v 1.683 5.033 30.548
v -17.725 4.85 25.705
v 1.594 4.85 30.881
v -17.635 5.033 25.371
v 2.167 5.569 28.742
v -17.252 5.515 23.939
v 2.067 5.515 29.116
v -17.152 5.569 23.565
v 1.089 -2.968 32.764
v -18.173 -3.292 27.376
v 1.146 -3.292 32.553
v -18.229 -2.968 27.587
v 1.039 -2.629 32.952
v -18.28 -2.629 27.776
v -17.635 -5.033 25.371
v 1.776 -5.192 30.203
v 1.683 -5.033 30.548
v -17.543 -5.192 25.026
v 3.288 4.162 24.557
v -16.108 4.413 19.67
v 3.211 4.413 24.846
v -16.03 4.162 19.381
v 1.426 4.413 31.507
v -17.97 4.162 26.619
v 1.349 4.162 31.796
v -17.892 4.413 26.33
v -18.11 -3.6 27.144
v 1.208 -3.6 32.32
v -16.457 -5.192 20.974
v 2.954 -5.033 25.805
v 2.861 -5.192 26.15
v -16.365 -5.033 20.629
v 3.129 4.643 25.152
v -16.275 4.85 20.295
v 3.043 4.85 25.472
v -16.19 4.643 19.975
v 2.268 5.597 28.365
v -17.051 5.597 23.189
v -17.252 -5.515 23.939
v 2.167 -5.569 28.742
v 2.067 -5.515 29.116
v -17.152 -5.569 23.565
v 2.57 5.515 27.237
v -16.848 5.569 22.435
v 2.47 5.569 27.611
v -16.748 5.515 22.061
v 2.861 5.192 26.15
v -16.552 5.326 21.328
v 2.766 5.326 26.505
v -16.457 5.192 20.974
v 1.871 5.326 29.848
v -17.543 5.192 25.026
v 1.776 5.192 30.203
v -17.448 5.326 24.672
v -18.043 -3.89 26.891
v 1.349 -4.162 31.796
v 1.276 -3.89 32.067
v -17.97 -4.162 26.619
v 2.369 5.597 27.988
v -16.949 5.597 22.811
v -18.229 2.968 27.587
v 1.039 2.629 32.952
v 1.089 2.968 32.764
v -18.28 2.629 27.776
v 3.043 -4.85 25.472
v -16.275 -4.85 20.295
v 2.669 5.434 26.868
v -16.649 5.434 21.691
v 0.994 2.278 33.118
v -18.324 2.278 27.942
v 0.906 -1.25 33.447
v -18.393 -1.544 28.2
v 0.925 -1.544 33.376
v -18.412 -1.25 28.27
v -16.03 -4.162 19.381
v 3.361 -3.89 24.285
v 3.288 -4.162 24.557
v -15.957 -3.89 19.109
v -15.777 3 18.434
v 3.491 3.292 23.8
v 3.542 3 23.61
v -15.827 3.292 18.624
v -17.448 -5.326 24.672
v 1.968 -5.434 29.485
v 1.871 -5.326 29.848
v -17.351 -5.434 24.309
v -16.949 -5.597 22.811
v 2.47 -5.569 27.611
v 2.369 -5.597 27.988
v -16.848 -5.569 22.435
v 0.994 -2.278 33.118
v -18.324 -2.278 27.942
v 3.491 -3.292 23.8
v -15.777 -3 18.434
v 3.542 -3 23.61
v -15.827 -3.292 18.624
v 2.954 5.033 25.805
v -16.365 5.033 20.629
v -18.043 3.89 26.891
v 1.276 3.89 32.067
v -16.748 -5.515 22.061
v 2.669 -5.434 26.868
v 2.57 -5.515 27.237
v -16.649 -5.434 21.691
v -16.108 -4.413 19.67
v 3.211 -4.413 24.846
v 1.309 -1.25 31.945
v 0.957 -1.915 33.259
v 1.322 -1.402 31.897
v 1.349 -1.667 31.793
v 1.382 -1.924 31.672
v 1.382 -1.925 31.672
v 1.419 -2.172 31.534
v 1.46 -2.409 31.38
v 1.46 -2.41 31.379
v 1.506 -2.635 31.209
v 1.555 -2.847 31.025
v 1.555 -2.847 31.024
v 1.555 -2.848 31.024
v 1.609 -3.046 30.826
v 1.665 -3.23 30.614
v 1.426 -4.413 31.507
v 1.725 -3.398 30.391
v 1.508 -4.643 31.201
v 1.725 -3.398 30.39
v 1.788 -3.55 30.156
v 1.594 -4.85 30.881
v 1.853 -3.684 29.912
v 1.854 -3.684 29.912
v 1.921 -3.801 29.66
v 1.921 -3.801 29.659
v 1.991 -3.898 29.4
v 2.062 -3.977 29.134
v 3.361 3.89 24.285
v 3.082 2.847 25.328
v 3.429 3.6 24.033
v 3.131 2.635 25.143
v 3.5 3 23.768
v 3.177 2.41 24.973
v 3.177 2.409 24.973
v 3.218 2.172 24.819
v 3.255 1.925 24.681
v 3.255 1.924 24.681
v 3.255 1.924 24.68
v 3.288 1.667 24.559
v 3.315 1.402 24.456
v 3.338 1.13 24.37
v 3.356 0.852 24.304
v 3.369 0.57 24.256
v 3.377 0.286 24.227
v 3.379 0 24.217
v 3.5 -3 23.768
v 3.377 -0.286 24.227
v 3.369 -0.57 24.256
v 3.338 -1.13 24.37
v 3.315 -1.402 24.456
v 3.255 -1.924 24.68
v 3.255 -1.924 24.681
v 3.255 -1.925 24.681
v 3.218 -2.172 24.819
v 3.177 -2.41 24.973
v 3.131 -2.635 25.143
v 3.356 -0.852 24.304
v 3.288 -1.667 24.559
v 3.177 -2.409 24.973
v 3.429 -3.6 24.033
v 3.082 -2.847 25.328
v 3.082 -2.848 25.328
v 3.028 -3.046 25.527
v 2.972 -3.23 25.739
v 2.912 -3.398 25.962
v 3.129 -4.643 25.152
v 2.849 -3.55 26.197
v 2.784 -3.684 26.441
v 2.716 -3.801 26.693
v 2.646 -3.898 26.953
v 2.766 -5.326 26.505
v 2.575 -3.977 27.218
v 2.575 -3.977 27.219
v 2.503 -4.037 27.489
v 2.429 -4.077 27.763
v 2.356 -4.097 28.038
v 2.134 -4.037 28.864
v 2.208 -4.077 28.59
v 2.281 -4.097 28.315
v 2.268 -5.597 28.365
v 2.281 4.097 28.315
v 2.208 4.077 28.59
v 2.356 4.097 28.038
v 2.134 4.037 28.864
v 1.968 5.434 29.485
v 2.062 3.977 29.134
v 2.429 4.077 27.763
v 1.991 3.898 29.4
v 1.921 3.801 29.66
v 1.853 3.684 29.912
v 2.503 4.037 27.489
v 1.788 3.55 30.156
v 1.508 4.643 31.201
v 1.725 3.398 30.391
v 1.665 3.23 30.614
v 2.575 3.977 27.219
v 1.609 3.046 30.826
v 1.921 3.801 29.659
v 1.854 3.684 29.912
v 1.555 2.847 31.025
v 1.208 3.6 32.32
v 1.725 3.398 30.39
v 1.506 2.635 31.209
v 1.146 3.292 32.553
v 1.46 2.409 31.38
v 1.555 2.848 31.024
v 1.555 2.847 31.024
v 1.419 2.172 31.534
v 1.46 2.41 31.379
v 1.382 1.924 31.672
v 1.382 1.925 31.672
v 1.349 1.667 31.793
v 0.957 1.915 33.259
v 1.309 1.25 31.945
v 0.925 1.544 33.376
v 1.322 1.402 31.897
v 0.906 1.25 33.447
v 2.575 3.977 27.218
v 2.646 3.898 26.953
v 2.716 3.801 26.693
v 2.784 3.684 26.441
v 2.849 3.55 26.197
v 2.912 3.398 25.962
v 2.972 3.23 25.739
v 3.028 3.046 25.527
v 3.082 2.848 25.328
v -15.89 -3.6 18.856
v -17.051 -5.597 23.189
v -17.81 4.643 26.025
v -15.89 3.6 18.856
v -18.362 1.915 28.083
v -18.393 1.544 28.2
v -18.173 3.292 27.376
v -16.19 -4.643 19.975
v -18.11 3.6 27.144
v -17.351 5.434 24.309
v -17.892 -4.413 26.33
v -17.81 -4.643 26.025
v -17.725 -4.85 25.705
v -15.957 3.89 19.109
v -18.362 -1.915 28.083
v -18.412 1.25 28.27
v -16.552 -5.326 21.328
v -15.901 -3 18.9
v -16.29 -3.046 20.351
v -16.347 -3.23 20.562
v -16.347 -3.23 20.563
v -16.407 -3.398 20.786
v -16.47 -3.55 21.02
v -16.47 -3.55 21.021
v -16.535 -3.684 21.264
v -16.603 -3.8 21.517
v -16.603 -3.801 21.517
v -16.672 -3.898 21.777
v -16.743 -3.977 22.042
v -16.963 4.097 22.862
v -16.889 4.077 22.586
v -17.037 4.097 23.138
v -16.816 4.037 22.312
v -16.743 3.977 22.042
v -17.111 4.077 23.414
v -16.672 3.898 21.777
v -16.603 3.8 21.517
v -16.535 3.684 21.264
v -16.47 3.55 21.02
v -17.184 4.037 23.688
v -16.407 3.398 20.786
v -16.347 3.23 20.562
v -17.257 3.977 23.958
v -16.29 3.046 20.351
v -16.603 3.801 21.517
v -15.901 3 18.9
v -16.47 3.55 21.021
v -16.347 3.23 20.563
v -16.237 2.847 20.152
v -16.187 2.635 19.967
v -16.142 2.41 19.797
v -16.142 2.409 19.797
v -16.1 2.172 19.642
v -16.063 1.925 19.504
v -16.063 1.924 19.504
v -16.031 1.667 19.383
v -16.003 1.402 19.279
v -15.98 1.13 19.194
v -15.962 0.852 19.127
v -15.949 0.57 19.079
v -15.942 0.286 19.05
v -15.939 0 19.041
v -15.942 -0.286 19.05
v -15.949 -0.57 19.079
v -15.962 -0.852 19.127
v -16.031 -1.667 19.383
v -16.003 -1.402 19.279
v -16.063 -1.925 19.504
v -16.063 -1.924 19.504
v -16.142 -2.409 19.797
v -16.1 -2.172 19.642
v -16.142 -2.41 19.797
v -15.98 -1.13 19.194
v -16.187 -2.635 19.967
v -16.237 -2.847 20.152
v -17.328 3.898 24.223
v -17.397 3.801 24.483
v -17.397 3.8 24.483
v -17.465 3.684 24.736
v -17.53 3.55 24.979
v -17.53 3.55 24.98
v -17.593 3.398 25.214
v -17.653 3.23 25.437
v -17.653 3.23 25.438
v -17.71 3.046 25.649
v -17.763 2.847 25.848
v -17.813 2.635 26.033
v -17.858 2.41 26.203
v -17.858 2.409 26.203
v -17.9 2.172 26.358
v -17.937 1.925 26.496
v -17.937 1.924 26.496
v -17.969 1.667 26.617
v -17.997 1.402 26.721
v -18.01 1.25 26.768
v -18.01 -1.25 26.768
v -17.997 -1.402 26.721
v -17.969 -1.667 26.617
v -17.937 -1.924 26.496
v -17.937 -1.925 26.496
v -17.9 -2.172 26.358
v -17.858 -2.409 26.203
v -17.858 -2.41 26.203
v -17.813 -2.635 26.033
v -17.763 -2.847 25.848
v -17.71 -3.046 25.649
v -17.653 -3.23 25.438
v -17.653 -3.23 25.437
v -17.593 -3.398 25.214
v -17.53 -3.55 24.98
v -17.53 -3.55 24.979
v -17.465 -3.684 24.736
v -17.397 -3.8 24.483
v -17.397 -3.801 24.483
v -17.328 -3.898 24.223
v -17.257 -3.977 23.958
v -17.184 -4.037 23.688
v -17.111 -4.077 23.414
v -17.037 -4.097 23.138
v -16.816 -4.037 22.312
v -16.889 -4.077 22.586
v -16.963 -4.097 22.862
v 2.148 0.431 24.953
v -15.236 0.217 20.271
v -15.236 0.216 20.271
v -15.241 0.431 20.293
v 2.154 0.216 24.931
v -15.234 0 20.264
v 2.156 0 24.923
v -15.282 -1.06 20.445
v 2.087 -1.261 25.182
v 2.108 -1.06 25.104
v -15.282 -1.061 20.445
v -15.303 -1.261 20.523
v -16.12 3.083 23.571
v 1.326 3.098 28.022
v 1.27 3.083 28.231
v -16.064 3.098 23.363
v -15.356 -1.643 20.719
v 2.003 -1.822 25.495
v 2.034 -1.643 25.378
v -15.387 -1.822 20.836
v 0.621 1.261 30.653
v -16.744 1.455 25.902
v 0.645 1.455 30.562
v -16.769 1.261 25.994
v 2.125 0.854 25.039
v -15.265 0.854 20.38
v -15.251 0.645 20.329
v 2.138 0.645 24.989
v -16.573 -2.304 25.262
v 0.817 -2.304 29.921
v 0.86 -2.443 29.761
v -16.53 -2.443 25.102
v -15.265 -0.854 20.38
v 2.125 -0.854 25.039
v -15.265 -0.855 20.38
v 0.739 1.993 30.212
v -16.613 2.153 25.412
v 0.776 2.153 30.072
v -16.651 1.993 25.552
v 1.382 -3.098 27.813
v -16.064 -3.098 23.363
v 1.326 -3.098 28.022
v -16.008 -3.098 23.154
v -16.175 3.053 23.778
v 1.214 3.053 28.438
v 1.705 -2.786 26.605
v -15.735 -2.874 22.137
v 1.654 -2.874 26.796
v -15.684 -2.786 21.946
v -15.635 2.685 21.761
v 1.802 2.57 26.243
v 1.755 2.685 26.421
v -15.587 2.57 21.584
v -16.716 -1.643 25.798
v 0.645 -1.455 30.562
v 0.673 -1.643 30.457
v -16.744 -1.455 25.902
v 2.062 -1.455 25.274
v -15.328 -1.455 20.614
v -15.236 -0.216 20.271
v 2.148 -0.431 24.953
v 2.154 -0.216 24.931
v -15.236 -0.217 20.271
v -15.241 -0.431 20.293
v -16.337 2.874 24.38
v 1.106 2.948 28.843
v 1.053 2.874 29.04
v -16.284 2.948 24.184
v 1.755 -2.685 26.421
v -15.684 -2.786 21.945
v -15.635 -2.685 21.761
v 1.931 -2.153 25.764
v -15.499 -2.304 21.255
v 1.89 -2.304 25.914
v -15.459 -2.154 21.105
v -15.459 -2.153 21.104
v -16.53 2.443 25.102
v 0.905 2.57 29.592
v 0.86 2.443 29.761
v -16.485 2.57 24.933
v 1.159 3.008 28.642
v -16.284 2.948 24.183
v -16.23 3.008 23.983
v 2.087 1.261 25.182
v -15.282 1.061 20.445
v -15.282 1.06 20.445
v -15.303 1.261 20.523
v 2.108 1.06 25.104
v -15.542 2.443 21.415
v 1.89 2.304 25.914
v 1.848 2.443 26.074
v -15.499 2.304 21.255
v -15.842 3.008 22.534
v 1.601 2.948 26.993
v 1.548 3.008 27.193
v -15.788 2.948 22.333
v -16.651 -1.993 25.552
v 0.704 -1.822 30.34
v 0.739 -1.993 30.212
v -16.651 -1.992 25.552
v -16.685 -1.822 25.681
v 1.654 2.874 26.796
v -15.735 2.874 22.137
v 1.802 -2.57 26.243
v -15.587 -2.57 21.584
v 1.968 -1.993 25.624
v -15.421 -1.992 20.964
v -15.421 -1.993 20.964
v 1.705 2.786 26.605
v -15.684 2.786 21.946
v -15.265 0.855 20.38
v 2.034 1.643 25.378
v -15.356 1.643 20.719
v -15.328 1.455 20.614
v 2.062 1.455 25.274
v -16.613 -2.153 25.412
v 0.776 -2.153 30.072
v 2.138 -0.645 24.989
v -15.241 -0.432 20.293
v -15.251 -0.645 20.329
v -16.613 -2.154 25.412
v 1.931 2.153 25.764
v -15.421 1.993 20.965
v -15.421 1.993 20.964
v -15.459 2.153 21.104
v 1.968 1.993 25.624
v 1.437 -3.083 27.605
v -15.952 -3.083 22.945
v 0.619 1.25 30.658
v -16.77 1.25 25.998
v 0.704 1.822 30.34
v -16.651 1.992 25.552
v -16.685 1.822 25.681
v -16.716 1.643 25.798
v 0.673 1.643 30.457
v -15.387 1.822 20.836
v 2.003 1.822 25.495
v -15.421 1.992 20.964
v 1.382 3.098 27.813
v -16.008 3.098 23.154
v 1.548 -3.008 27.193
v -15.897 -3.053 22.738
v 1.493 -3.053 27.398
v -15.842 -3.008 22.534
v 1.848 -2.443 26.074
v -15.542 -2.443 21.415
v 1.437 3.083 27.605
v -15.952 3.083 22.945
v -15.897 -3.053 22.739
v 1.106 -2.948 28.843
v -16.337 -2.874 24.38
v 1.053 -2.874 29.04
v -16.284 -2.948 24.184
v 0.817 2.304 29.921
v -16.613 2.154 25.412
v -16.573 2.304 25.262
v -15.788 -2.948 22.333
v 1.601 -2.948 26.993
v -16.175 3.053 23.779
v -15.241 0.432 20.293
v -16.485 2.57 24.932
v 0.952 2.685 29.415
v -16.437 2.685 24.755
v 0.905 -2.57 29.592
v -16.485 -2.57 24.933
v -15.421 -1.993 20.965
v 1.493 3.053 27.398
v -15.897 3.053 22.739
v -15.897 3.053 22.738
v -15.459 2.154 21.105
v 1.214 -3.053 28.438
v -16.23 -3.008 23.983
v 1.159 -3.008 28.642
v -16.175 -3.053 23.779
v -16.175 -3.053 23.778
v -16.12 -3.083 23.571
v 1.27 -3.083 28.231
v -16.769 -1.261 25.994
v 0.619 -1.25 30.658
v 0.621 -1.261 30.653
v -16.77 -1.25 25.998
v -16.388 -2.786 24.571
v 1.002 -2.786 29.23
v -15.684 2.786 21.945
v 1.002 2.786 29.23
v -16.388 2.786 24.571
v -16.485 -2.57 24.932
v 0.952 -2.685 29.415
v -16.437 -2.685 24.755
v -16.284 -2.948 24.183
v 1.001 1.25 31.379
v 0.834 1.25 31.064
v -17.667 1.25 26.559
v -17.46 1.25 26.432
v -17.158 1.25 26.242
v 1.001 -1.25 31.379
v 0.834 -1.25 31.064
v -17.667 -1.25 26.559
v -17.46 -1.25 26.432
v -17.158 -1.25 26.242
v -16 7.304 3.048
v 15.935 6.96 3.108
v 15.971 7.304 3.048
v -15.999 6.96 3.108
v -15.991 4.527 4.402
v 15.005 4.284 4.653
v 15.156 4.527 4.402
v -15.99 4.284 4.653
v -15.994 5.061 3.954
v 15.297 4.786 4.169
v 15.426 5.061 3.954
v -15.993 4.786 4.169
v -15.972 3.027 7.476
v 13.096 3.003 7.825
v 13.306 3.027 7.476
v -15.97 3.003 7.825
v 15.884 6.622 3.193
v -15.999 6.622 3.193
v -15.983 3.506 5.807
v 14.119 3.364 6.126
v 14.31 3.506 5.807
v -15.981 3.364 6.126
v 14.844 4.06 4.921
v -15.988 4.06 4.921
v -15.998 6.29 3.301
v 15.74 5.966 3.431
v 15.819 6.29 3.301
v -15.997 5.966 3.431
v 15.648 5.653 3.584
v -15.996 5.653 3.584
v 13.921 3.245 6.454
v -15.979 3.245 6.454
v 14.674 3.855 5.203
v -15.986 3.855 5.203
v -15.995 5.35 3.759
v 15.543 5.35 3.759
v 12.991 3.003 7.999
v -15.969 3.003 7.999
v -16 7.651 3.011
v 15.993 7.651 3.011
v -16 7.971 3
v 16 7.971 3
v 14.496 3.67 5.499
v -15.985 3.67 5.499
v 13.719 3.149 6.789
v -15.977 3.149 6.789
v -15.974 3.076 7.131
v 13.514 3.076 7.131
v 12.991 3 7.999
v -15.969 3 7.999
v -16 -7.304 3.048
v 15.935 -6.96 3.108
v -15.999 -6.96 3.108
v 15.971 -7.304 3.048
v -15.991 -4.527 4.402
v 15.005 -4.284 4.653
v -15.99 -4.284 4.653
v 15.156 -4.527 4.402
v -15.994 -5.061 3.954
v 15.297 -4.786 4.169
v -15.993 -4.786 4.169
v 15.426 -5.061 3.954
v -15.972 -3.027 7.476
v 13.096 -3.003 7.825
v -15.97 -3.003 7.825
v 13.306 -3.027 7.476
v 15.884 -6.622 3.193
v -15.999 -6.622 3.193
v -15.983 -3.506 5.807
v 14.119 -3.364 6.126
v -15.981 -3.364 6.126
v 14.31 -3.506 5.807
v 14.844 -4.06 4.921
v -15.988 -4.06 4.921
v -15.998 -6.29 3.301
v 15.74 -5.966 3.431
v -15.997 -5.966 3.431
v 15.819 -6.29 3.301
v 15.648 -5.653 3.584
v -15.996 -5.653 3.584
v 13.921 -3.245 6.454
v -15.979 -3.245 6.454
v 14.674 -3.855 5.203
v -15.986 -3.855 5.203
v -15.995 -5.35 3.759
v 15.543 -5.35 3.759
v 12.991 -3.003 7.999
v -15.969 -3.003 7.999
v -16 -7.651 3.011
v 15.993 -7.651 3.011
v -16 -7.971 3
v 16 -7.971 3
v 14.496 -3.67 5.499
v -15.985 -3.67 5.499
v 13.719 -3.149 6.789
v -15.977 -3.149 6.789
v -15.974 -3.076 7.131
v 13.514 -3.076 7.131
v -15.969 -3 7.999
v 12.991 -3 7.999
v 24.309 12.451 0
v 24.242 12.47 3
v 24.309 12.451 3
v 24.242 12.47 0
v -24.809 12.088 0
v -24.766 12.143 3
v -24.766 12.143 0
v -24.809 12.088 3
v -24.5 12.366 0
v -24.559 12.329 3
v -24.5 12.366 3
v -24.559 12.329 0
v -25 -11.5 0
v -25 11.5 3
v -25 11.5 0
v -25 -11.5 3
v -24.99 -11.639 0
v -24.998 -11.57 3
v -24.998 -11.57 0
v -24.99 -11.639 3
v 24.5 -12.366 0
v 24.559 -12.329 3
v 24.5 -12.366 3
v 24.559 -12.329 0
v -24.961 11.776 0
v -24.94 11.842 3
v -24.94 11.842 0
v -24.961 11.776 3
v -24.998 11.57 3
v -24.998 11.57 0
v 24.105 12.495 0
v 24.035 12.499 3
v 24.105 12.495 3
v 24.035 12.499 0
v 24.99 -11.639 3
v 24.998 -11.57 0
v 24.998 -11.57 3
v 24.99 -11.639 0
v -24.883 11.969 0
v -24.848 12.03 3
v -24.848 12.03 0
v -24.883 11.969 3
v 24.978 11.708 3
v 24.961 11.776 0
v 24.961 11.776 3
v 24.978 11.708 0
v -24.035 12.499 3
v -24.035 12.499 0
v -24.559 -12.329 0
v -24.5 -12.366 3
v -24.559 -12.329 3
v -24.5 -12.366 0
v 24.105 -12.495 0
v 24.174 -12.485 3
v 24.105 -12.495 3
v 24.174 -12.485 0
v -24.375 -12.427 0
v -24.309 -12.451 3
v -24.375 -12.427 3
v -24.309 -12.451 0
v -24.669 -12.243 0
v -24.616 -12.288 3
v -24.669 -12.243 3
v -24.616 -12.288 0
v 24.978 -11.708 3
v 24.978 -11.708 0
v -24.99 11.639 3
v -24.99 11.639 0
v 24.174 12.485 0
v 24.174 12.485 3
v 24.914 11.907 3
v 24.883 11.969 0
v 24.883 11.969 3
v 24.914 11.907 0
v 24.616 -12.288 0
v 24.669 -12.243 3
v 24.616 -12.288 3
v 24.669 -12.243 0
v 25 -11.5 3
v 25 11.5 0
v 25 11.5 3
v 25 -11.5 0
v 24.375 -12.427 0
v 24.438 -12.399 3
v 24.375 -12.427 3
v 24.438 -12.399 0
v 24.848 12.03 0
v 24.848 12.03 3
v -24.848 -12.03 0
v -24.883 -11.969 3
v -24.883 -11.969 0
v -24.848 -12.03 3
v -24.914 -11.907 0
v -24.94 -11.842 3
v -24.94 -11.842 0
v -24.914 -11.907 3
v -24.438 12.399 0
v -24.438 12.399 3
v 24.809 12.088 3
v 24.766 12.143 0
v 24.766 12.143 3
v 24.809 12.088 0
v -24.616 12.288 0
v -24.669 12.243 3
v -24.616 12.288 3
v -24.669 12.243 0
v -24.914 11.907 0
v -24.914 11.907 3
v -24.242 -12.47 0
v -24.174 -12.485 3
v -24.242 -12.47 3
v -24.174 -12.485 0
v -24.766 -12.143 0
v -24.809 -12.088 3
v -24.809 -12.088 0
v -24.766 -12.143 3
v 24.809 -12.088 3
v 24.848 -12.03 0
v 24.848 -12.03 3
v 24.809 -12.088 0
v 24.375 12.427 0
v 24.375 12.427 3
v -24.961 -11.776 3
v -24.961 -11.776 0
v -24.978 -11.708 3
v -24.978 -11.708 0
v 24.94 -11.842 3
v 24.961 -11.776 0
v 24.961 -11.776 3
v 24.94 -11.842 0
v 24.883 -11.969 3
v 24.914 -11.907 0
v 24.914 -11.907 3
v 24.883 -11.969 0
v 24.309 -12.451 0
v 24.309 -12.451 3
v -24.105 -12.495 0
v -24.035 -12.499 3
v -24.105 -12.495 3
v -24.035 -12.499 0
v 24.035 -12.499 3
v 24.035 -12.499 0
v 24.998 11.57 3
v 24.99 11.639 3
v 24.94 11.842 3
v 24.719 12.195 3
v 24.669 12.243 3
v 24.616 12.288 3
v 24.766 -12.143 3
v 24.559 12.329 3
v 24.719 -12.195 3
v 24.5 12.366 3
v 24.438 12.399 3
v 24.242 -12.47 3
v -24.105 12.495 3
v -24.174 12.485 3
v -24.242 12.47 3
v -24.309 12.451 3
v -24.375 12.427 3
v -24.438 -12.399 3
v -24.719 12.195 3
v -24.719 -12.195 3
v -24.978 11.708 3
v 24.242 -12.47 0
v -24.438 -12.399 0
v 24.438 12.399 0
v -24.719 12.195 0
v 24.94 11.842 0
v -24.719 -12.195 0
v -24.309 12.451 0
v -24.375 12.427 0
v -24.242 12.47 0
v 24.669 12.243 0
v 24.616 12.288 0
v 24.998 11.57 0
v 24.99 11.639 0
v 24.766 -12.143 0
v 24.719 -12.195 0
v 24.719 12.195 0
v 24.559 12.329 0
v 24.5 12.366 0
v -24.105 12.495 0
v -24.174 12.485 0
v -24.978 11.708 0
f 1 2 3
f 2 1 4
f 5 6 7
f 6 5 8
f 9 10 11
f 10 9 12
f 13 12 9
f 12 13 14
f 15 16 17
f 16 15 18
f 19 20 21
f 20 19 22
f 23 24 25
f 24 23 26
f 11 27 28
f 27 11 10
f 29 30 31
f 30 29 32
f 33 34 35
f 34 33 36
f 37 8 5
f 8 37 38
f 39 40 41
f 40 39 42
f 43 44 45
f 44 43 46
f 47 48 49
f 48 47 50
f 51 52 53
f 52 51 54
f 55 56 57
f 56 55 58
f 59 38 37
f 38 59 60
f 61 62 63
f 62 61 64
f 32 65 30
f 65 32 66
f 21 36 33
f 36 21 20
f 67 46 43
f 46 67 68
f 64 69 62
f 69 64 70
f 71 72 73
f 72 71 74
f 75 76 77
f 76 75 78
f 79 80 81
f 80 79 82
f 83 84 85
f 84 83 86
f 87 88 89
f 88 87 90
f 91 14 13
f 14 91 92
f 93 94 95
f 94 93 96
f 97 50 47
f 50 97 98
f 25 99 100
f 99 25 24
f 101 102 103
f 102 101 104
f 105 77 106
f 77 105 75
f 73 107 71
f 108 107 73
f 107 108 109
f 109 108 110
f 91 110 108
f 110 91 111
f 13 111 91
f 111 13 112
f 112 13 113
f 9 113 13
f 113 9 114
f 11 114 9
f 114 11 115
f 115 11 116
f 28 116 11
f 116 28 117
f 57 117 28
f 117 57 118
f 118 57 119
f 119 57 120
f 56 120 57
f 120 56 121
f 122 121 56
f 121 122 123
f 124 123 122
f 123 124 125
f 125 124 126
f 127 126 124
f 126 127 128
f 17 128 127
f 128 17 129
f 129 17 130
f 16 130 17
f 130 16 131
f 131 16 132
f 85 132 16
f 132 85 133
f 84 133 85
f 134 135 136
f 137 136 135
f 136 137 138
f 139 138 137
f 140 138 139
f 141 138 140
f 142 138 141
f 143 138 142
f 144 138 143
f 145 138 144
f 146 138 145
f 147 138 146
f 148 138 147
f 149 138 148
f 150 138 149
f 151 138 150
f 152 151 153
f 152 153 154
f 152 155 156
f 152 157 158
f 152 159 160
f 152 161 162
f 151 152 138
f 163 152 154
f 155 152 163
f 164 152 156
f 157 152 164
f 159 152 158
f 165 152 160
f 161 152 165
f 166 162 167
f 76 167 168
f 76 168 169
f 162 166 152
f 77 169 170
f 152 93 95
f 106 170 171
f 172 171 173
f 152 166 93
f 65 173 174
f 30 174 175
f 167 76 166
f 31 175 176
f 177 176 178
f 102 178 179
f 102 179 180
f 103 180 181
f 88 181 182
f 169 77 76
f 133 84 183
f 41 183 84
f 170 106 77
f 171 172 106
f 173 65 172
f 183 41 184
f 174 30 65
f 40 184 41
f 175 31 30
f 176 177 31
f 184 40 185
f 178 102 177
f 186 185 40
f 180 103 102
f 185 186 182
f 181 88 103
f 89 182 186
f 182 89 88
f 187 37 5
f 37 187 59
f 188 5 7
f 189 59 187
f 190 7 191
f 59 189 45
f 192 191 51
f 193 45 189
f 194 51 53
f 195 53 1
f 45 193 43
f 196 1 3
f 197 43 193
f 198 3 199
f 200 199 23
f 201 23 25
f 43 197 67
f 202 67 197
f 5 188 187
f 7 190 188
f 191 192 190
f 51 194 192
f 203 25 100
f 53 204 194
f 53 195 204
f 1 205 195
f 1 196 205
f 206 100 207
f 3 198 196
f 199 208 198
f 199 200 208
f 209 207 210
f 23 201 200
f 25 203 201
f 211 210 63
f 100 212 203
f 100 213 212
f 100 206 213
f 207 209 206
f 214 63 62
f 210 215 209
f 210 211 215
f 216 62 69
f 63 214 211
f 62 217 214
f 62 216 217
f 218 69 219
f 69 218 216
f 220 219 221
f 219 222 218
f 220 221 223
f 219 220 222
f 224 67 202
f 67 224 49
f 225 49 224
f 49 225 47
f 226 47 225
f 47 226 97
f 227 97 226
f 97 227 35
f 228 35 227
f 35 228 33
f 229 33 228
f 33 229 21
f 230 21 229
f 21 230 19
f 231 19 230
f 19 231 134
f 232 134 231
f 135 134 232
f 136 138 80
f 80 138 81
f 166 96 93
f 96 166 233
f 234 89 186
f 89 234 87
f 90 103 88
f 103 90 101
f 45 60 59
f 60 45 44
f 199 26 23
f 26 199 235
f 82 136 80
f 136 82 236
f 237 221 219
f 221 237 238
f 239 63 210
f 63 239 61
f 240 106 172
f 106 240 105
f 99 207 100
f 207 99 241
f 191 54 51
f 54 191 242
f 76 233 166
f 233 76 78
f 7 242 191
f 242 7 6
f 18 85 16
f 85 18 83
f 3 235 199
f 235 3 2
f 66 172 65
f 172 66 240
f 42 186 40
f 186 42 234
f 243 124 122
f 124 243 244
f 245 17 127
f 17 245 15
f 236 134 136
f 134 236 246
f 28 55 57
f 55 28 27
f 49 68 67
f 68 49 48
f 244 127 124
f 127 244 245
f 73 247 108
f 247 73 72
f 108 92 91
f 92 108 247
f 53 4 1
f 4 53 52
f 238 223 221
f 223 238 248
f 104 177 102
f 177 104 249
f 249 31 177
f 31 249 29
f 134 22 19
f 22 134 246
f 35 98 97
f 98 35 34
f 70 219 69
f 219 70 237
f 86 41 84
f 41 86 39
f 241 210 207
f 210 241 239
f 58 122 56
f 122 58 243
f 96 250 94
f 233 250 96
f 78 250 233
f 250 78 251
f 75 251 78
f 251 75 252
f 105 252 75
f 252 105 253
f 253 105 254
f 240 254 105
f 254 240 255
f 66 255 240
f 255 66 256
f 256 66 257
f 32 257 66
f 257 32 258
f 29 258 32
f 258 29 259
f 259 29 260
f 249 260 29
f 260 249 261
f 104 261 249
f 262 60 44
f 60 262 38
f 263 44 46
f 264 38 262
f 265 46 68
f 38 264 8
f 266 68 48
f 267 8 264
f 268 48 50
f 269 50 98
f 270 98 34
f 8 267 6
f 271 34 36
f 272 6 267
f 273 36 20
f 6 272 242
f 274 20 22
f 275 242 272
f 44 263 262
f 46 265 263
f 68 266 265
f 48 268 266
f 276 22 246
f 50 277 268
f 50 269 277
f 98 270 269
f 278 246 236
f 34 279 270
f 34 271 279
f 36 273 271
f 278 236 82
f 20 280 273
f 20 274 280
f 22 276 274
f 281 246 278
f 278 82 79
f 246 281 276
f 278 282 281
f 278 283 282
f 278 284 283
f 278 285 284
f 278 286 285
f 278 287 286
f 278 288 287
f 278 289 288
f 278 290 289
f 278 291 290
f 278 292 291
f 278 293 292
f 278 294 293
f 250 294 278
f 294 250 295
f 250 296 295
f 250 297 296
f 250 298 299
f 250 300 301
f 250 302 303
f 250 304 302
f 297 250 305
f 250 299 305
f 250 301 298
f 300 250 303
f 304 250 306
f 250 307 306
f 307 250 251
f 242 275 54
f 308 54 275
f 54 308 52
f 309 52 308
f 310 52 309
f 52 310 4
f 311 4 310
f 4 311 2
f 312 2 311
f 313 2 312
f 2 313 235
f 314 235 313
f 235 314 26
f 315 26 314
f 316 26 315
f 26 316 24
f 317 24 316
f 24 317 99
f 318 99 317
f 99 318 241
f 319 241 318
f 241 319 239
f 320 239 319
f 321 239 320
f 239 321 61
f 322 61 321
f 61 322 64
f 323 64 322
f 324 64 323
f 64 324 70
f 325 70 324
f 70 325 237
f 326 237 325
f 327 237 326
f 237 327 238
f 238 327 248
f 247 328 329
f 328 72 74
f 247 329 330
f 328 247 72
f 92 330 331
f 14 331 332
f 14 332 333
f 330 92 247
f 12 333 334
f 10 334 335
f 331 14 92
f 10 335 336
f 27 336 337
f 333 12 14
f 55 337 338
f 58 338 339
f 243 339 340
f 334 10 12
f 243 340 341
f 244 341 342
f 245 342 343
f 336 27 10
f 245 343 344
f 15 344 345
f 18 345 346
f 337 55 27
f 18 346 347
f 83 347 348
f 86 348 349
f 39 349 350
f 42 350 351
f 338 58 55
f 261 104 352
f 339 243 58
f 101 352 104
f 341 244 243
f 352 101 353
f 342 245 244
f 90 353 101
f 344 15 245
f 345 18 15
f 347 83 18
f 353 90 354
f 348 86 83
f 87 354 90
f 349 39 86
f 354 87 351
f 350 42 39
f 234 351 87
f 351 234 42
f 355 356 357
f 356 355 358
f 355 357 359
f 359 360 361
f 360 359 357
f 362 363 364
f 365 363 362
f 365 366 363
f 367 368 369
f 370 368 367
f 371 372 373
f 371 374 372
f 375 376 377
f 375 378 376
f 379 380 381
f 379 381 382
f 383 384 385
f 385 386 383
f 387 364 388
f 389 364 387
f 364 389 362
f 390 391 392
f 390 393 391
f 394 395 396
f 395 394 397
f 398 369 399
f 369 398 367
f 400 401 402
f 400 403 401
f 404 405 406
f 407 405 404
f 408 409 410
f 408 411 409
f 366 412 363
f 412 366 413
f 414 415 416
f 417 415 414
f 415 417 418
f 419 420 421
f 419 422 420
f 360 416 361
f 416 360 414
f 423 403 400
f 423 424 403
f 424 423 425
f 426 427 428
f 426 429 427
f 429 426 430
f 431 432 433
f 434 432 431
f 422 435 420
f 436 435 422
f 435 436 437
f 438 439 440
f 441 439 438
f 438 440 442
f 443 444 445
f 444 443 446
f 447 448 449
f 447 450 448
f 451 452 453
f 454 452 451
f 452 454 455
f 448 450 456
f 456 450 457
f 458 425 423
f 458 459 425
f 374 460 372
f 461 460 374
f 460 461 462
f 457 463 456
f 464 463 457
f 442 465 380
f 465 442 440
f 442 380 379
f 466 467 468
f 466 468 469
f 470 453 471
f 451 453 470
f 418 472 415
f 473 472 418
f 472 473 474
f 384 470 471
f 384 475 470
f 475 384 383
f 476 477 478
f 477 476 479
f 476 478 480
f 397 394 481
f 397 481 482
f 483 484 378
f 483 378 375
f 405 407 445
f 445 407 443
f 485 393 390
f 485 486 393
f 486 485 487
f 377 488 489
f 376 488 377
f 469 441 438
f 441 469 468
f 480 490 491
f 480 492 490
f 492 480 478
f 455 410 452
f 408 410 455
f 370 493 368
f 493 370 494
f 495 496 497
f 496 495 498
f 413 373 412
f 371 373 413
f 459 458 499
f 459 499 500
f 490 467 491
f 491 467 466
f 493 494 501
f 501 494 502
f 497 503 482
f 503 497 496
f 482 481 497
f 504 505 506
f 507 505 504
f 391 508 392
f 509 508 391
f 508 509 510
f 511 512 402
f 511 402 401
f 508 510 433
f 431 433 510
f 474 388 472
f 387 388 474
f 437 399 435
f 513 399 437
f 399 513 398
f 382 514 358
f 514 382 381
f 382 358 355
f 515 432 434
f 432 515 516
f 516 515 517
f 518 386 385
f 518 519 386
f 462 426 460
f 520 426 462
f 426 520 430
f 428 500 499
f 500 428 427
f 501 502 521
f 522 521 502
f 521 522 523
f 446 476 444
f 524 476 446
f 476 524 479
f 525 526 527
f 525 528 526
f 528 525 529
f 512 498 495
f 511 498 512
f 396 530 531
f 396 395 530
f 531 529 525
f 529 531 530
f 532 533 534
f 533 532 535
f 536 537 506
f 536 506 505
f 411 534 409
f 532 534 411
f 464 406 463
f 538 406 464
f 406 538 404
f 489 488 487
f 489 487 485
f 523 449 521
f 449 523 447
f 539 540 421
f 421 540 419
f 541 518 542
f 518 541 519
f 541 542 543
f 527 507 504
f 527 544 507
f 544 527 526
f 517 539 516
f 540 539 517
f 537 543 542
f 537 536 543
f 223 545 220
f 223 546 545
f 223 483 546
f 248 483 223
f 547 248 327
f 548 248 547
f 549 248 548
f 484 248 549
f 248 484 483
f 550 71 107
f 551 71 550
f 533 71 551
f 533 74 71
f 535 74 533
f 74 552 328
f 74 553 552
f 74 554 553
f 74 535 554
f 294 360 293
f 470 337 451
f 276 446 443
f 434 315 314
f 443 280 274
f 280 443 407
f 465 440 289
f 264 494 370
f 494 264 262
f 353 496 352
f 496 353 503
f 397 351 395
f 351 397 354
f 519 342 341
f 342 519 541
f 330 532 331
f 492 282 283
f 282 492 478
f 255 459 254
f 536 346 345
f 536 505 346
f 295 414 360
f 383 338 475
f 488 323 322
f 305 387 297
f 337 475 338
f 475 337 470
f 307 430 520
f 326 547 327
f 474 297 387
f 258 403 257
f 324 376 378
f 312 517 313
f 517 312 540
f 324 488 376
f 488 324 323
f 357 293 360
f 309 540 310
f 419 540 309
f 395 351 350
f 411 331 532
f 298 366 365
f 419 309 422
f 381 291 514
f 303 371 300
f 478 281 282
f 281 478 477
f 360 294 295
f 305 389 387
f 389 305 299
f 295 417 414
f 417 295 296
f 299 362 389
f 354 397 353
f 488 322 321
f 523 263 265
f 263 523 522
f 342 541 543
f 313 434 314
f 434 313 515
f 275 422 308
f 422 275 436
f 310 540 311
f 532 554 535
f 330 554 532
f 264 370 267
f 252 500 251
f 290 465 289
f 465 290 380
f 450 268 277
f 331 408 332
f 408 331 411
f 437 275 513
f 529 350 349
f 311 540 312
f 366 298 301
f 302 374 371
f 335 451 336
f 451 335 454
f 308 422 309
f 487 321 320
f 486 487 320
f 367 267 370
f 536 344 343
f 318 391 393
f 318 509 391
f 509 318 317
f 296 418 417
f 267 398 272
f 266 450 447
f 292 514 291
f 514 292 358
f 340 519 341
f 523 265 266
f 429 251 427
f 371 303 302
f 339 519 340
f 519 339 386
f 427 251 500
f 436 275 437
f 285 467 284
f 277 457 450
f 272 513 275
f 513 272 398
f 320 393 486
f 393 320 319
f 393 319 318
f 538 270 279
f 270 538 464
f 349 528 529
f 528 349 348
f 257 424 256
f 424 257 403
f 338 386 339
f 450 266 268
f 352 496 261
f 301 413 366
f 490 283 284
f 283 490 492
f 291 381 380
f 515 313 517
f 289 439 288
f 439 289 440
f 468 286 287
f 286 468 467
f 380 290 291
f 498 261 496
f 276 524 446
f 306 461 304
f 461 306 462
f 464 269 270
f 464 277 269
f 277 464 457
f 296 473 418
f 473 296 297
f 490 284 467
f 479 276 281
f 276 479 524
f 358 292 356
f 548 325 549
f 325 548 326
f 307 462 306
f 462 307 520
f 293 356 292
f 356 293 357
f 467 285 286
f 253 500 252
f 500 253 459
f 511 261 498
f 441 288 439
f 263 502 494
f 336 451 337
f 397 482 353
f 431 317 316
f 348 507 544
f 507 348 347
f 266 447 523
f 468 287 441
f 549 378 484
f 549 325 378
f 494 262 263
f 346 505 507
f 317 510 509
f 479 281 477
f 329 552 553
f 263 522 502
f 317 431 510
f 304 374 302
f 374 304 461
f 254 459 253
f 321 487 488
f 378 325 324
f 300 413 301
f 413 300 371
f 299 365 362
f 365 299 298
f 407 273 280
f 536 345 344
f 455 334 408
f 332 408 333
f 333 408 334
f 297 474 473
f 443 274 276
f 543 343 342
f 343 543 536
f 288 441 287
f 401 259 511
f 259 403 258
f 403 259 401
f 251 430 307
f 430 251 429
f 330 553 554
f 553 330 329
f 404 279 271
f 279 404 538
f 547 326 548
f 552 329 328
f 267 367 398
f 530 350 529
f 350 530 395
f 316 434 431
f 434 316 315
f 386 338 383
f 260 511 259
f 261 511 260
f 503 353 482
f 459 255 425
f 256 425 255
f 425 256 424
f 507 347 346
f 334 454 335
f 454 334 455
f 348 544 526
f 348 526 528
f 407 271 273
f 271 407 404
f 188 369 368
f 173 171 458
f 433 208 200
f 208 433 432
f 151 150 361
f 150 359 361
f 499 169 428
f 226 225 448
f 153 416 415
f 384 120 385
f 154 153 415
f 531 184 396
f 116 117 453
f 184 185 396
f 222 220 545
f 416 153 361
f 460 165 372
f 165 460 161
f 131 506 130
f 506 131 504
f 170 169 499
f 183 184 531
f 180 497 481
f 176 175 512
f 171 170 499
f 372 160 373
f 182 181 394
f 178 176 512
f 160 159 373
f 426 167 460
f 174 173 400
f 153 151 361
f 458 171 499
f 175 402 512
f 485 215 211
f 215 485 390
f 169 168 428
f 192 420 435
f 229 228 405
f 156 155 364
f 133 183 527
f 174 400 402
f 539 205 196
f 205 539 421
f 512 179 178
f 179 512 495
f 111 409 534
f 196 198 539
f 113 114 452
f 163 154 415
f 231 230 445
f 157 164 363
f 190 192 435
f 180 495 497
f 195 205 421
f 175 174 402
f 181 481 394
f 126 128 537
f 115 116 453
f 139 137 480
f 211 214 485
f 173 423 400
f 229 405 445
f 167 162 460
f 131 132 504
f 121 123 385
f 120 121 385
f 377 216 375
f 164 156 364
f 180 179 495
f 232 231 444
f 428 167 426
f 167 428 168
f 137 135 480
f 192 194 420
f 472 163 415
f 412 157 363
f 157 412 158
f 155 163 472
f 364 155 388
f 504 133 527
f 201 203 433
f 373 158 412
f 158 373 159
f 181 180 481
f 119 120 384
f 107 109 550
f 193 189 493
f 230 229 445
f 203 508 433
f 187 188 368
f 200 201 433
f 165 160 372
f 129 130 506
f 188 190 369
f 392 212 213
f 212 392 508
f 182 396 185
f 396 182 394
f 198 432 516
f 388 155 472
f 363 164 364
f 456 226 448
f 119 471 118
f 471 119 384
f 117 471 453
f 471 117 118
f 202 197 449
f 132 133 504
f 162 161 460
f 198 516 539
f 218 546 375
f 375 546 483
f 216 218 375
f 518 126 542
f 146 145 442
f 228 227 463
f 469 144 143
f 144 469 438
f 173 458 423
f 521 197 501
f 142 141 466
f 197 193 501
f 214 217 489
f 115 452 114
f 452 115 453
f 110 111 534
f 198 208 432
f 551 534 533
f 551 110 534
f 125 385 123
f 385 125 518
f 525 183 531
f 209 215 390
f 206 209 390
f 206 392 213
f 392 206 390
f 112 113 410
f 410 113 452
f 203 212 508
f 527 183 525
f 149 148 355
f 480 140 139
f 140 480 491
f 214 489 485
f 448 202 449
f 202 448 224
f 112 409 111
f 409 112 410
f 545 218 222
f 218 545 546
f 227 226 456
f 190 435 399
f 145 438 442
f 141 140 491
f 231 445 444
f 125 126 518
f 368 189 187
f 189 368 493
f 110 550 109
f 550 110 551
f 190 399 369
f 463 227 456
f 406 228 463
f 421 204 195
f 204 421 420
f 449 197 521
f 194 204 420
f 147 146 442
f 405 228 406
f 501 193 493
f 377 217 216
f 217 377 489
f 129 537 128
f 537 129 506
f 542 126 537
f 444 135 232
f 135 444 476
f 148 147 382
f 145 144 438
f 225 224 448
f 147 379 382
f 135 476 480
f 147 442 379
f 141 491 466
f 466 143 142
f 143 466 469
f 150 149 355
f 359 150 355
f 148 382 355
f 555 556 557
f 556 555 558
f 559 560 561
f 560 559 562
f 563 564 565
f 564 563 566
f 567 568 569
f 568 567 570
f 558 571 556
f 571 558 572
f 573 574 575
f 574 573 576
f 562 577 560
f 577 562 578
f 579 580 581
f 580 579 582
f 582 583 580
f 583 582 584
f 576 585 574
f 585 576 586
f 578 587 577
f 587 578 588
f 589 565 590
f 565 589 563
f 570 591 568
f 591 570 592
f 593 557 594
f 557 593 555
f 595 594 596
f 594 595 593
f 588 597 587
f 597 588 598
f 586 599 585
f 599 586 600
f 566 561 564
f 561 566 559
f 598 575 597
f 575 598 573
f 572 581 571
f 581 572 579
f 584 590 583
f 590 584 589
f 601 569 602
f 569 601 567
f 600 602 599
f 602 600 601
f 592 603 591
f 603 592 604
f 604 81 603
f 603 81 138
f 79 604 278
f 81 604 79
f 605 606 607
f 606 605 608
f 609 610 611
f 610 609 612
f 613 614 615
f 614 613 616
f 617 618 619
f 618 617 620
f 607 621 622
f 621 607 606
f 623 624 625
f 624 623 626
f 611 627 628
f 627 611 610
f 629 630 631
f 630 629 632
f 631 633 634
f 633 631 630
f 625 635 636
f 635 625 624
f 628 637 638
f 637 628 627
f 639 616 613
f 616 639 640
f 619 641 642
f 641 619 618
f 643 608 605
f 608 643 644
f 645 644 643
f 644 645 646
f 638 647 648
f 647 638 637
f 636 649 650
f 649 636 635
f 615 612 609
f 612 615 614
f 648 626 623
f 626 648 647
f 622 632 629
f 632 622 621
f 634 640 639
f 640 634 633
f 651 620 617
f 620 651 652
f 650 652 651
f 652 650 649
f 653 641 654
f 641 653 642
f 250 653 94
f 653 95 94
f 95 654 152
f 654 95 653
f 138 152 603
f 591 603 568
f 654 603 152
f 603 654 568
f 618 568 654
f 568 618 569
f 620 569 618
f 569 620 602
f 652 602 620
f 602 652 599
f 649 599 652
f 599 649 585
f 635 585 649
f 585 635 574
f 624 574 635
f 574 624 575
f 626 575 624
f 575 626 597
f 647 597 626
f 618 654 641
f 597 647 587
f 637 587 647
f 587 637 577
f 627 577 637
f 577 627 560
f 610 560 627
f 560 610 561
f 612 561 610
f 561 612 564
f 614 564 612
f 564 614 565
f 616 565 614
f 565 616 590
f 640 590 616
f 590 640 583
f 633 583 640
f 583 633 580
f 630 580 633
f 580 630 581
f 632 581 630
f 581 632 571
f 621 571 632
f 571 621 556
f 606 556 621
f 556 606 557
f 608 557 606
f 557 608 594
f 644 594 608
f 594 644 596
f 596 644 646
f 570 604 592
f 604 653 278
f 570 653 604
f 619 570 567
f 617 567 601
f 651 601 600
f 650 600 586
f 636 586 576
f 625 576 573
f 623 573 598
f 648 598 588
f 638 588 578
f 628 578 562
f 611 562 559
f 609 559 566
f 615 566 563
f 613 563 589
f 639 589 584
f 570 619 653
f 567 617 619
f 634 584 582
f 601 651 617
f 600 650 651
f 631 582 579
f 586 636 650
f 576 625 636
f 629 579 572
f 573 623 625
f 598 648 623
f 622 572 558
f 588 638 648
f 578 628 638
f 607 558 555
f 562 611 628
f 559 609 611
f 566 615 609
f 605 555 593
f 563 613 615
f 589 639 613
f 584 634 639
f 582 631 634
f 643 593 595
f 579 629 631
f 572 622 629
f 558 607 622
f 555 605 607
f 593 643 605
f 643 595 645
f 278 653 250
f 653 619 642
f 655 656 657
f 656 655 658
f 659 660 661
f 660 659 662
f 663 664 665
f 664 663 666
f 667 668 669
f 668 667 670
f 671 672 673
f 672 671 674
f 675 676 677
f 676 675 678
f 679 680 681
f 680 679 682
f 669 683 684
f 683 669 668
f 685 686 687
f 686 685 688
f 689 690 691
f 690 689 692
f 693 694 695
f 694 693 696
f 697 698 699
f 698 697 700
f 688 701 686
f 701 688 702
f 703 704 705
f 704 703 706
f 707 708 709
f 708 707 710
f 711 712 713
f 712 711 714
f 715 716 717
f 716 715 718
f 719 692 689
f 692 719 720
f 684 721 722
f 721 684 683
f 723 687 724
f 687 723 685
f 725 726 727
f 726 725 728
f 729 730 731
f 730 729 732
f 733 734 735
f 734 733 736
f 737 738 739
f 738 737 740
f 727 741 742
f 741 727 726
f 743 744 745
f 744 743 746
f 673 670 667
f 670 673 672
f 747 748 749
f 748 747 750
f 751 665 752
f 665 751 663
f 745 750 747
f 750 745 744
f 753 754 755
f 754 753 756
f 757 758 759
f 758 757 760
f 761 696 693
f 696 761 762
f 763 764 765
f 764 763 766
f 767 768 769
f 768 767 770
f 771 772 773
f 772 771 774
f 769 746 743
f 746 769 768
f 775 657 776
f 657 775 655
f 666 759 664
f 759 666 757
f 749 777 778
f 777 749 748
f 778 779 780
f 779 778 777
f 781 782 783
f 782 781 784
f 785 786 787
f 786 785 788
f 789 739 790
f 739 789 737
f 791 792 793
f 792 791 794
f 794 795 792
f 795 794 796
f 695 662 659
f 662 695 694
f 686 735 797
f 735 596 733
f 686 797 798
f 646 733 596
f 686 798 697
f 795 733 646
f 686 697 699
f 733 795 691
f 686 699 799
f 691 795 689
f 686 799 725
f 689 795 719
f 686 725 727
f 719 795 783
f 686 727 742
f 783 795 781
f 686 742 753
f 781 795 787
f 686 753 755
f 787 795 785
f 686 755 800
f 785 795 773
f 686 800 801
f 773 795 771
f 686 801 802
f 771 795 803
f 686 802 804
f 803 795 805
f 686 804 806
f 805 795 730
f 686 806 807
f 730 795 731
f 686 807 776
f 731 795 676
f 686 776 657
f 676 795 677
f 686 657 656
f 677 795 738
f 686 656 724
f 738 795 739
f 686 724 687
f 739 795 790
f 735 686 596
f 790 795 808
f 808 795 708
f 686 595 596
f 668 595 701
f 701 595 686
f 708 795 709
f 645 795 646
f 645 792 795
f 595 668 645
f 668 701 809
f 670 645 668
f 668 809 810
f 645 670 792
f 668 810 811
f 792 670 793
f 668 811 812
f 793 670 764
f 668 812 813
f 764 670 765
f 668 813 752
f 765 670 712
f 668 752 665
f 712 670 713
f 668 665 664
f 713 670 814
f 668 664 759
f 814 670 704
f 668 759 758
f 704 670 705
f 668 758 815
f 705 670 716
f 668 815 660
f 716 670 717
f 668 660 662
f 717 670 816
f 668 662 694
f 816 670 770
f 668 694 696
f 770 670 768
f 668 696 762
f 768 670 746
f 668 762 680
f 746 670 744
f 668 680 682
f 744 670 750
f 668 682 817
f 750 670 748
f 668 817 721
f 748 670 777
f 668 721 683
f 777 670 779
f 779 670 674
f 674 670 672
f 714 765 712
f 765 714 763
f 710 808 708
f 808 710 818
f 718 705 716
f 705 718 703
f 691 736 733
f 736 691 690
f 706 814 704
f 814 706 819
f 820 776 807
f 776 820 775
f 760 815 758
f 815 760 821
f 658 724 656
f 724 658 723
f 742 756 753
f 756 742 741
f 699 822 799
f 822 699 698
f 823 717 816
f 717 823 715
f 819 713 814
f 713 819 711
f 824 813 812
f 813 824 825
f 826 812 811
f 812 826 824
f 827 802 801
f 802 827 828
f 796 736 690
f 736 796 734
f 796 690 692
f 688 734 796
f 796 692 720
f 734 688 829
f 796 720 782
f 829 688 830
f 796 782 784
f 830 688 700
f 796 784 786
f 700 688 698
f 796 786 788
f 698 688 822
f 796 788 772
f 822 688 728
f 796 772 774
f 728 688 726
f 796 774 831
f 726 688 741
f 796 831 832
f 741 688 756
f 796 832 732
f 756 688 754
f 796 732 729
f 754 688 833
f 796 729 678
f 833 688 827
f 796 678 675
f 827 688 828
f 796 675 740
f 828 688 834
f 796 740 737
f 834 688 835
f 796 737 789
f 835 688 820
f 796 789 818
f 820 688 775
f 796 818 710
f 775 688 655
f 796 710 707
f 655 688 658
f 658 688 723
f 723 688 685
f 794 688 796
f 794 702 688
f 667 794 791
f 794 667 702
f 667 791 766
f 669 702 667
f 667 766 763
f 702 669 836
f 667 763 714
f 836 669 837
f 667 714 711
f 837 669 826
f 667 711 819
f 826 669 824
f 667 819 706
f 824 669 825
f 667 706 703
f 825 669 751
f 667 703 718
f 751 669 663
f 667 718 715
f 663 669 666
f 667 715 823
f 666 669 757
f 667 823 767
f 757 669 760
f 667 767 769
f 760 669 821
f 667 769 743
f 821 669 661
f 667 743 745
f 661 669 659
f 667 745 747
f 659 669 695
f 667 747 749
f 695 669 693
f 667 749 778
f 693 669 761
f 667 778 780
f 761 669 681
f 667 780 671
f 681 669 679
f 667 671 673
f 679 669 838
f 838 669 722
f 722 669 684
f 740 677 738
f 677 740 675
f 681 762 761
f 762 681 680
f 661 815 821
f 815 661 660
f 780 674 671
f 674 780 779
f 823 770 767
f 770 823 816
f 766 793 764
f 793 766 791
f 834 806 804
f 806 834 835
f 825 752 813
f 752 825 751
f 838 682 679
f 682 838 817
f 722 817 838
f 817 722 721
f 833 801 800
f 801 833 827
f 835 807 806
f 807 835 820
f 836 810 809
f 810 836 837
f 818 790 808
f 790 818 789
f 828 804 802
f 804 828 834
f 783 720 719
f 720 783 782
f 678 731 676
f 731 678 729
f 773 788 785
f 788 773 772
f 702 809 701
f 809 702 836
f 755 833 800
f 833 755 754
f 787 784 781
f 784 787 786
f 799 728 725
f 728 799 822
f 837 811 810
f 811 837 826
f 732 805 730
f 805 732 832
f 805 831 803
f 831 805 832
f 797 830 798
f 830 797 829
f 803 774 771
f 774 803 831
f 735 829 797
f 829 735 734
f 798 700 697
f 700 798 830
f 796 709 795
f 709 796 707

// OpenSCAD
// Flashforge tube guide.

// TODO: clean up the code.

// Holder tilt angle in degrees.
angle = 15;
// Distance of the tube holders from the printer case.
distance_from_case = 20;

// Controls the distance between the centerlines of the bases.
base_width = 51;

//half_base_width = base_width / 2;

base_thickness=3;

// Width of the fillament slots.
filament_slot_width = 2.5;
// Inner diameter of the tube holders.
hole_diameter = 6.2;
// Length of the tube holder holes.
holder_length = 20;
// Thickness of the tube holder wall. Affects flexibility.
hole_wall = 2.5;
// Chamfer at the tube holder holes ends.
hole_chamfer = 1;

/* [Hidden] */

$fn=90;
eps1 = 0.001;
eps2 = eps1 * 2;

// Side is 1 or -1.
//module base_bar(side) {
//  translate([-32.5, side*half_base_width, 3]) rotate([0, 90, 0]) cylinder(d=6, h=65);
//}

module base_bars() {
  base_bar(1);
  base_bar(-1);
}

// Side is 1 or -1.
module tube_holder(side) {
  translate([-17, 0, distance_from_case+3]) 
  rotate([0, 90-angle, 0]) 
  difference() {
    cylinder(d=hole_diameter+2*hole_wall, h=holder_length);
    // Tube hole
    translate([0, 0, -eps1]) 
      cylinder(d=hole_diameter, h=holder_length+eps2); 
    // Filament slots
    translate([-20, -filament_slot_width/2, -eps1]) 
      cube([20, filament_slot_width, holder_length+eps2]);
    // Bottom chamfer
    translate([0, 0, -eps1]) 
      cylinder(d1=hole_diameter+2*hole_chamfer, d2 = hole_diameter - eps2, h=hole_chamfer);
    // Top chamfer
    translate([0, 0, holder_length-hole_chamfer+eps1]) 
      cylinder(d1=hole_diameter, d2= hole_diameter+2*hole_chamfer,  h=hole_chamfer);
  }
}

//module tube_holders() {
//  tube_holder(1);
//  tube_holder(-1);
//}

//module cross_bar() {
//  translate([-16, -(half_base_width-4.5), distance_from_case]) rotate([0, -angle, 0]) cube([holder_length, base_width-9, 4]);
//}

// Side is 1 or -1.
module pillar() {
  width = 6;
  chamfer = 5;  // radius
  raw_width = width + 2*chamfer;
  difference() {
    hull() {
      // Top strip.
      translate([-15.9, -raw_width/2, distance_from_case- base_thickness-0.9]) rotate([0, -angle, 0]) 
        cube([holder_length-0.2, raw_width, eps1]);

      // Bottom strip.
      translate([-16, -raw_width/2, 0]) cube([32, raw_width, eps1]);
    }
    
    for (i = [0: 1]) {
      mirror([0, i, 0]) {
        translate([-16-eps1, chamfer+width/2, chamfer])
        rotate([0, 90, 0])
        cylinder(r=chamfer, h=32+eps2);
        
        translate([-16-eps1, width/2, chamfer])
        cube([32+eps2, 2*chamfer, distance_from_case]);
      }
    }
  }
}

module base() {
  width = 25;
  length = 50;
  r = 1;
  dx = length/2 - r;
  dy = width/2 - r;
  hull() {
    for (i=[-1:2:1]) {
      for (j=[-1:2:1]) {
        translate([i*dx, j*dy, 0]) {
          cylinder(r=r, h=base_thickness);
        }
      }
    }
  }
}

//module pillars() {
//  pillar(1);
//  pillar(-1);
//}

module main() {
  //#base_bars();
  //cross_bar();
  tube_holder();
  translate([0, 0, base_thickness-eps1]) #pillar();
  base();
}

// For design
main();

// For printing (with support at the bottom, less visible)
//rotate([0, 0, 0]) 
//main();

//pillar();

//base_bar(1);
